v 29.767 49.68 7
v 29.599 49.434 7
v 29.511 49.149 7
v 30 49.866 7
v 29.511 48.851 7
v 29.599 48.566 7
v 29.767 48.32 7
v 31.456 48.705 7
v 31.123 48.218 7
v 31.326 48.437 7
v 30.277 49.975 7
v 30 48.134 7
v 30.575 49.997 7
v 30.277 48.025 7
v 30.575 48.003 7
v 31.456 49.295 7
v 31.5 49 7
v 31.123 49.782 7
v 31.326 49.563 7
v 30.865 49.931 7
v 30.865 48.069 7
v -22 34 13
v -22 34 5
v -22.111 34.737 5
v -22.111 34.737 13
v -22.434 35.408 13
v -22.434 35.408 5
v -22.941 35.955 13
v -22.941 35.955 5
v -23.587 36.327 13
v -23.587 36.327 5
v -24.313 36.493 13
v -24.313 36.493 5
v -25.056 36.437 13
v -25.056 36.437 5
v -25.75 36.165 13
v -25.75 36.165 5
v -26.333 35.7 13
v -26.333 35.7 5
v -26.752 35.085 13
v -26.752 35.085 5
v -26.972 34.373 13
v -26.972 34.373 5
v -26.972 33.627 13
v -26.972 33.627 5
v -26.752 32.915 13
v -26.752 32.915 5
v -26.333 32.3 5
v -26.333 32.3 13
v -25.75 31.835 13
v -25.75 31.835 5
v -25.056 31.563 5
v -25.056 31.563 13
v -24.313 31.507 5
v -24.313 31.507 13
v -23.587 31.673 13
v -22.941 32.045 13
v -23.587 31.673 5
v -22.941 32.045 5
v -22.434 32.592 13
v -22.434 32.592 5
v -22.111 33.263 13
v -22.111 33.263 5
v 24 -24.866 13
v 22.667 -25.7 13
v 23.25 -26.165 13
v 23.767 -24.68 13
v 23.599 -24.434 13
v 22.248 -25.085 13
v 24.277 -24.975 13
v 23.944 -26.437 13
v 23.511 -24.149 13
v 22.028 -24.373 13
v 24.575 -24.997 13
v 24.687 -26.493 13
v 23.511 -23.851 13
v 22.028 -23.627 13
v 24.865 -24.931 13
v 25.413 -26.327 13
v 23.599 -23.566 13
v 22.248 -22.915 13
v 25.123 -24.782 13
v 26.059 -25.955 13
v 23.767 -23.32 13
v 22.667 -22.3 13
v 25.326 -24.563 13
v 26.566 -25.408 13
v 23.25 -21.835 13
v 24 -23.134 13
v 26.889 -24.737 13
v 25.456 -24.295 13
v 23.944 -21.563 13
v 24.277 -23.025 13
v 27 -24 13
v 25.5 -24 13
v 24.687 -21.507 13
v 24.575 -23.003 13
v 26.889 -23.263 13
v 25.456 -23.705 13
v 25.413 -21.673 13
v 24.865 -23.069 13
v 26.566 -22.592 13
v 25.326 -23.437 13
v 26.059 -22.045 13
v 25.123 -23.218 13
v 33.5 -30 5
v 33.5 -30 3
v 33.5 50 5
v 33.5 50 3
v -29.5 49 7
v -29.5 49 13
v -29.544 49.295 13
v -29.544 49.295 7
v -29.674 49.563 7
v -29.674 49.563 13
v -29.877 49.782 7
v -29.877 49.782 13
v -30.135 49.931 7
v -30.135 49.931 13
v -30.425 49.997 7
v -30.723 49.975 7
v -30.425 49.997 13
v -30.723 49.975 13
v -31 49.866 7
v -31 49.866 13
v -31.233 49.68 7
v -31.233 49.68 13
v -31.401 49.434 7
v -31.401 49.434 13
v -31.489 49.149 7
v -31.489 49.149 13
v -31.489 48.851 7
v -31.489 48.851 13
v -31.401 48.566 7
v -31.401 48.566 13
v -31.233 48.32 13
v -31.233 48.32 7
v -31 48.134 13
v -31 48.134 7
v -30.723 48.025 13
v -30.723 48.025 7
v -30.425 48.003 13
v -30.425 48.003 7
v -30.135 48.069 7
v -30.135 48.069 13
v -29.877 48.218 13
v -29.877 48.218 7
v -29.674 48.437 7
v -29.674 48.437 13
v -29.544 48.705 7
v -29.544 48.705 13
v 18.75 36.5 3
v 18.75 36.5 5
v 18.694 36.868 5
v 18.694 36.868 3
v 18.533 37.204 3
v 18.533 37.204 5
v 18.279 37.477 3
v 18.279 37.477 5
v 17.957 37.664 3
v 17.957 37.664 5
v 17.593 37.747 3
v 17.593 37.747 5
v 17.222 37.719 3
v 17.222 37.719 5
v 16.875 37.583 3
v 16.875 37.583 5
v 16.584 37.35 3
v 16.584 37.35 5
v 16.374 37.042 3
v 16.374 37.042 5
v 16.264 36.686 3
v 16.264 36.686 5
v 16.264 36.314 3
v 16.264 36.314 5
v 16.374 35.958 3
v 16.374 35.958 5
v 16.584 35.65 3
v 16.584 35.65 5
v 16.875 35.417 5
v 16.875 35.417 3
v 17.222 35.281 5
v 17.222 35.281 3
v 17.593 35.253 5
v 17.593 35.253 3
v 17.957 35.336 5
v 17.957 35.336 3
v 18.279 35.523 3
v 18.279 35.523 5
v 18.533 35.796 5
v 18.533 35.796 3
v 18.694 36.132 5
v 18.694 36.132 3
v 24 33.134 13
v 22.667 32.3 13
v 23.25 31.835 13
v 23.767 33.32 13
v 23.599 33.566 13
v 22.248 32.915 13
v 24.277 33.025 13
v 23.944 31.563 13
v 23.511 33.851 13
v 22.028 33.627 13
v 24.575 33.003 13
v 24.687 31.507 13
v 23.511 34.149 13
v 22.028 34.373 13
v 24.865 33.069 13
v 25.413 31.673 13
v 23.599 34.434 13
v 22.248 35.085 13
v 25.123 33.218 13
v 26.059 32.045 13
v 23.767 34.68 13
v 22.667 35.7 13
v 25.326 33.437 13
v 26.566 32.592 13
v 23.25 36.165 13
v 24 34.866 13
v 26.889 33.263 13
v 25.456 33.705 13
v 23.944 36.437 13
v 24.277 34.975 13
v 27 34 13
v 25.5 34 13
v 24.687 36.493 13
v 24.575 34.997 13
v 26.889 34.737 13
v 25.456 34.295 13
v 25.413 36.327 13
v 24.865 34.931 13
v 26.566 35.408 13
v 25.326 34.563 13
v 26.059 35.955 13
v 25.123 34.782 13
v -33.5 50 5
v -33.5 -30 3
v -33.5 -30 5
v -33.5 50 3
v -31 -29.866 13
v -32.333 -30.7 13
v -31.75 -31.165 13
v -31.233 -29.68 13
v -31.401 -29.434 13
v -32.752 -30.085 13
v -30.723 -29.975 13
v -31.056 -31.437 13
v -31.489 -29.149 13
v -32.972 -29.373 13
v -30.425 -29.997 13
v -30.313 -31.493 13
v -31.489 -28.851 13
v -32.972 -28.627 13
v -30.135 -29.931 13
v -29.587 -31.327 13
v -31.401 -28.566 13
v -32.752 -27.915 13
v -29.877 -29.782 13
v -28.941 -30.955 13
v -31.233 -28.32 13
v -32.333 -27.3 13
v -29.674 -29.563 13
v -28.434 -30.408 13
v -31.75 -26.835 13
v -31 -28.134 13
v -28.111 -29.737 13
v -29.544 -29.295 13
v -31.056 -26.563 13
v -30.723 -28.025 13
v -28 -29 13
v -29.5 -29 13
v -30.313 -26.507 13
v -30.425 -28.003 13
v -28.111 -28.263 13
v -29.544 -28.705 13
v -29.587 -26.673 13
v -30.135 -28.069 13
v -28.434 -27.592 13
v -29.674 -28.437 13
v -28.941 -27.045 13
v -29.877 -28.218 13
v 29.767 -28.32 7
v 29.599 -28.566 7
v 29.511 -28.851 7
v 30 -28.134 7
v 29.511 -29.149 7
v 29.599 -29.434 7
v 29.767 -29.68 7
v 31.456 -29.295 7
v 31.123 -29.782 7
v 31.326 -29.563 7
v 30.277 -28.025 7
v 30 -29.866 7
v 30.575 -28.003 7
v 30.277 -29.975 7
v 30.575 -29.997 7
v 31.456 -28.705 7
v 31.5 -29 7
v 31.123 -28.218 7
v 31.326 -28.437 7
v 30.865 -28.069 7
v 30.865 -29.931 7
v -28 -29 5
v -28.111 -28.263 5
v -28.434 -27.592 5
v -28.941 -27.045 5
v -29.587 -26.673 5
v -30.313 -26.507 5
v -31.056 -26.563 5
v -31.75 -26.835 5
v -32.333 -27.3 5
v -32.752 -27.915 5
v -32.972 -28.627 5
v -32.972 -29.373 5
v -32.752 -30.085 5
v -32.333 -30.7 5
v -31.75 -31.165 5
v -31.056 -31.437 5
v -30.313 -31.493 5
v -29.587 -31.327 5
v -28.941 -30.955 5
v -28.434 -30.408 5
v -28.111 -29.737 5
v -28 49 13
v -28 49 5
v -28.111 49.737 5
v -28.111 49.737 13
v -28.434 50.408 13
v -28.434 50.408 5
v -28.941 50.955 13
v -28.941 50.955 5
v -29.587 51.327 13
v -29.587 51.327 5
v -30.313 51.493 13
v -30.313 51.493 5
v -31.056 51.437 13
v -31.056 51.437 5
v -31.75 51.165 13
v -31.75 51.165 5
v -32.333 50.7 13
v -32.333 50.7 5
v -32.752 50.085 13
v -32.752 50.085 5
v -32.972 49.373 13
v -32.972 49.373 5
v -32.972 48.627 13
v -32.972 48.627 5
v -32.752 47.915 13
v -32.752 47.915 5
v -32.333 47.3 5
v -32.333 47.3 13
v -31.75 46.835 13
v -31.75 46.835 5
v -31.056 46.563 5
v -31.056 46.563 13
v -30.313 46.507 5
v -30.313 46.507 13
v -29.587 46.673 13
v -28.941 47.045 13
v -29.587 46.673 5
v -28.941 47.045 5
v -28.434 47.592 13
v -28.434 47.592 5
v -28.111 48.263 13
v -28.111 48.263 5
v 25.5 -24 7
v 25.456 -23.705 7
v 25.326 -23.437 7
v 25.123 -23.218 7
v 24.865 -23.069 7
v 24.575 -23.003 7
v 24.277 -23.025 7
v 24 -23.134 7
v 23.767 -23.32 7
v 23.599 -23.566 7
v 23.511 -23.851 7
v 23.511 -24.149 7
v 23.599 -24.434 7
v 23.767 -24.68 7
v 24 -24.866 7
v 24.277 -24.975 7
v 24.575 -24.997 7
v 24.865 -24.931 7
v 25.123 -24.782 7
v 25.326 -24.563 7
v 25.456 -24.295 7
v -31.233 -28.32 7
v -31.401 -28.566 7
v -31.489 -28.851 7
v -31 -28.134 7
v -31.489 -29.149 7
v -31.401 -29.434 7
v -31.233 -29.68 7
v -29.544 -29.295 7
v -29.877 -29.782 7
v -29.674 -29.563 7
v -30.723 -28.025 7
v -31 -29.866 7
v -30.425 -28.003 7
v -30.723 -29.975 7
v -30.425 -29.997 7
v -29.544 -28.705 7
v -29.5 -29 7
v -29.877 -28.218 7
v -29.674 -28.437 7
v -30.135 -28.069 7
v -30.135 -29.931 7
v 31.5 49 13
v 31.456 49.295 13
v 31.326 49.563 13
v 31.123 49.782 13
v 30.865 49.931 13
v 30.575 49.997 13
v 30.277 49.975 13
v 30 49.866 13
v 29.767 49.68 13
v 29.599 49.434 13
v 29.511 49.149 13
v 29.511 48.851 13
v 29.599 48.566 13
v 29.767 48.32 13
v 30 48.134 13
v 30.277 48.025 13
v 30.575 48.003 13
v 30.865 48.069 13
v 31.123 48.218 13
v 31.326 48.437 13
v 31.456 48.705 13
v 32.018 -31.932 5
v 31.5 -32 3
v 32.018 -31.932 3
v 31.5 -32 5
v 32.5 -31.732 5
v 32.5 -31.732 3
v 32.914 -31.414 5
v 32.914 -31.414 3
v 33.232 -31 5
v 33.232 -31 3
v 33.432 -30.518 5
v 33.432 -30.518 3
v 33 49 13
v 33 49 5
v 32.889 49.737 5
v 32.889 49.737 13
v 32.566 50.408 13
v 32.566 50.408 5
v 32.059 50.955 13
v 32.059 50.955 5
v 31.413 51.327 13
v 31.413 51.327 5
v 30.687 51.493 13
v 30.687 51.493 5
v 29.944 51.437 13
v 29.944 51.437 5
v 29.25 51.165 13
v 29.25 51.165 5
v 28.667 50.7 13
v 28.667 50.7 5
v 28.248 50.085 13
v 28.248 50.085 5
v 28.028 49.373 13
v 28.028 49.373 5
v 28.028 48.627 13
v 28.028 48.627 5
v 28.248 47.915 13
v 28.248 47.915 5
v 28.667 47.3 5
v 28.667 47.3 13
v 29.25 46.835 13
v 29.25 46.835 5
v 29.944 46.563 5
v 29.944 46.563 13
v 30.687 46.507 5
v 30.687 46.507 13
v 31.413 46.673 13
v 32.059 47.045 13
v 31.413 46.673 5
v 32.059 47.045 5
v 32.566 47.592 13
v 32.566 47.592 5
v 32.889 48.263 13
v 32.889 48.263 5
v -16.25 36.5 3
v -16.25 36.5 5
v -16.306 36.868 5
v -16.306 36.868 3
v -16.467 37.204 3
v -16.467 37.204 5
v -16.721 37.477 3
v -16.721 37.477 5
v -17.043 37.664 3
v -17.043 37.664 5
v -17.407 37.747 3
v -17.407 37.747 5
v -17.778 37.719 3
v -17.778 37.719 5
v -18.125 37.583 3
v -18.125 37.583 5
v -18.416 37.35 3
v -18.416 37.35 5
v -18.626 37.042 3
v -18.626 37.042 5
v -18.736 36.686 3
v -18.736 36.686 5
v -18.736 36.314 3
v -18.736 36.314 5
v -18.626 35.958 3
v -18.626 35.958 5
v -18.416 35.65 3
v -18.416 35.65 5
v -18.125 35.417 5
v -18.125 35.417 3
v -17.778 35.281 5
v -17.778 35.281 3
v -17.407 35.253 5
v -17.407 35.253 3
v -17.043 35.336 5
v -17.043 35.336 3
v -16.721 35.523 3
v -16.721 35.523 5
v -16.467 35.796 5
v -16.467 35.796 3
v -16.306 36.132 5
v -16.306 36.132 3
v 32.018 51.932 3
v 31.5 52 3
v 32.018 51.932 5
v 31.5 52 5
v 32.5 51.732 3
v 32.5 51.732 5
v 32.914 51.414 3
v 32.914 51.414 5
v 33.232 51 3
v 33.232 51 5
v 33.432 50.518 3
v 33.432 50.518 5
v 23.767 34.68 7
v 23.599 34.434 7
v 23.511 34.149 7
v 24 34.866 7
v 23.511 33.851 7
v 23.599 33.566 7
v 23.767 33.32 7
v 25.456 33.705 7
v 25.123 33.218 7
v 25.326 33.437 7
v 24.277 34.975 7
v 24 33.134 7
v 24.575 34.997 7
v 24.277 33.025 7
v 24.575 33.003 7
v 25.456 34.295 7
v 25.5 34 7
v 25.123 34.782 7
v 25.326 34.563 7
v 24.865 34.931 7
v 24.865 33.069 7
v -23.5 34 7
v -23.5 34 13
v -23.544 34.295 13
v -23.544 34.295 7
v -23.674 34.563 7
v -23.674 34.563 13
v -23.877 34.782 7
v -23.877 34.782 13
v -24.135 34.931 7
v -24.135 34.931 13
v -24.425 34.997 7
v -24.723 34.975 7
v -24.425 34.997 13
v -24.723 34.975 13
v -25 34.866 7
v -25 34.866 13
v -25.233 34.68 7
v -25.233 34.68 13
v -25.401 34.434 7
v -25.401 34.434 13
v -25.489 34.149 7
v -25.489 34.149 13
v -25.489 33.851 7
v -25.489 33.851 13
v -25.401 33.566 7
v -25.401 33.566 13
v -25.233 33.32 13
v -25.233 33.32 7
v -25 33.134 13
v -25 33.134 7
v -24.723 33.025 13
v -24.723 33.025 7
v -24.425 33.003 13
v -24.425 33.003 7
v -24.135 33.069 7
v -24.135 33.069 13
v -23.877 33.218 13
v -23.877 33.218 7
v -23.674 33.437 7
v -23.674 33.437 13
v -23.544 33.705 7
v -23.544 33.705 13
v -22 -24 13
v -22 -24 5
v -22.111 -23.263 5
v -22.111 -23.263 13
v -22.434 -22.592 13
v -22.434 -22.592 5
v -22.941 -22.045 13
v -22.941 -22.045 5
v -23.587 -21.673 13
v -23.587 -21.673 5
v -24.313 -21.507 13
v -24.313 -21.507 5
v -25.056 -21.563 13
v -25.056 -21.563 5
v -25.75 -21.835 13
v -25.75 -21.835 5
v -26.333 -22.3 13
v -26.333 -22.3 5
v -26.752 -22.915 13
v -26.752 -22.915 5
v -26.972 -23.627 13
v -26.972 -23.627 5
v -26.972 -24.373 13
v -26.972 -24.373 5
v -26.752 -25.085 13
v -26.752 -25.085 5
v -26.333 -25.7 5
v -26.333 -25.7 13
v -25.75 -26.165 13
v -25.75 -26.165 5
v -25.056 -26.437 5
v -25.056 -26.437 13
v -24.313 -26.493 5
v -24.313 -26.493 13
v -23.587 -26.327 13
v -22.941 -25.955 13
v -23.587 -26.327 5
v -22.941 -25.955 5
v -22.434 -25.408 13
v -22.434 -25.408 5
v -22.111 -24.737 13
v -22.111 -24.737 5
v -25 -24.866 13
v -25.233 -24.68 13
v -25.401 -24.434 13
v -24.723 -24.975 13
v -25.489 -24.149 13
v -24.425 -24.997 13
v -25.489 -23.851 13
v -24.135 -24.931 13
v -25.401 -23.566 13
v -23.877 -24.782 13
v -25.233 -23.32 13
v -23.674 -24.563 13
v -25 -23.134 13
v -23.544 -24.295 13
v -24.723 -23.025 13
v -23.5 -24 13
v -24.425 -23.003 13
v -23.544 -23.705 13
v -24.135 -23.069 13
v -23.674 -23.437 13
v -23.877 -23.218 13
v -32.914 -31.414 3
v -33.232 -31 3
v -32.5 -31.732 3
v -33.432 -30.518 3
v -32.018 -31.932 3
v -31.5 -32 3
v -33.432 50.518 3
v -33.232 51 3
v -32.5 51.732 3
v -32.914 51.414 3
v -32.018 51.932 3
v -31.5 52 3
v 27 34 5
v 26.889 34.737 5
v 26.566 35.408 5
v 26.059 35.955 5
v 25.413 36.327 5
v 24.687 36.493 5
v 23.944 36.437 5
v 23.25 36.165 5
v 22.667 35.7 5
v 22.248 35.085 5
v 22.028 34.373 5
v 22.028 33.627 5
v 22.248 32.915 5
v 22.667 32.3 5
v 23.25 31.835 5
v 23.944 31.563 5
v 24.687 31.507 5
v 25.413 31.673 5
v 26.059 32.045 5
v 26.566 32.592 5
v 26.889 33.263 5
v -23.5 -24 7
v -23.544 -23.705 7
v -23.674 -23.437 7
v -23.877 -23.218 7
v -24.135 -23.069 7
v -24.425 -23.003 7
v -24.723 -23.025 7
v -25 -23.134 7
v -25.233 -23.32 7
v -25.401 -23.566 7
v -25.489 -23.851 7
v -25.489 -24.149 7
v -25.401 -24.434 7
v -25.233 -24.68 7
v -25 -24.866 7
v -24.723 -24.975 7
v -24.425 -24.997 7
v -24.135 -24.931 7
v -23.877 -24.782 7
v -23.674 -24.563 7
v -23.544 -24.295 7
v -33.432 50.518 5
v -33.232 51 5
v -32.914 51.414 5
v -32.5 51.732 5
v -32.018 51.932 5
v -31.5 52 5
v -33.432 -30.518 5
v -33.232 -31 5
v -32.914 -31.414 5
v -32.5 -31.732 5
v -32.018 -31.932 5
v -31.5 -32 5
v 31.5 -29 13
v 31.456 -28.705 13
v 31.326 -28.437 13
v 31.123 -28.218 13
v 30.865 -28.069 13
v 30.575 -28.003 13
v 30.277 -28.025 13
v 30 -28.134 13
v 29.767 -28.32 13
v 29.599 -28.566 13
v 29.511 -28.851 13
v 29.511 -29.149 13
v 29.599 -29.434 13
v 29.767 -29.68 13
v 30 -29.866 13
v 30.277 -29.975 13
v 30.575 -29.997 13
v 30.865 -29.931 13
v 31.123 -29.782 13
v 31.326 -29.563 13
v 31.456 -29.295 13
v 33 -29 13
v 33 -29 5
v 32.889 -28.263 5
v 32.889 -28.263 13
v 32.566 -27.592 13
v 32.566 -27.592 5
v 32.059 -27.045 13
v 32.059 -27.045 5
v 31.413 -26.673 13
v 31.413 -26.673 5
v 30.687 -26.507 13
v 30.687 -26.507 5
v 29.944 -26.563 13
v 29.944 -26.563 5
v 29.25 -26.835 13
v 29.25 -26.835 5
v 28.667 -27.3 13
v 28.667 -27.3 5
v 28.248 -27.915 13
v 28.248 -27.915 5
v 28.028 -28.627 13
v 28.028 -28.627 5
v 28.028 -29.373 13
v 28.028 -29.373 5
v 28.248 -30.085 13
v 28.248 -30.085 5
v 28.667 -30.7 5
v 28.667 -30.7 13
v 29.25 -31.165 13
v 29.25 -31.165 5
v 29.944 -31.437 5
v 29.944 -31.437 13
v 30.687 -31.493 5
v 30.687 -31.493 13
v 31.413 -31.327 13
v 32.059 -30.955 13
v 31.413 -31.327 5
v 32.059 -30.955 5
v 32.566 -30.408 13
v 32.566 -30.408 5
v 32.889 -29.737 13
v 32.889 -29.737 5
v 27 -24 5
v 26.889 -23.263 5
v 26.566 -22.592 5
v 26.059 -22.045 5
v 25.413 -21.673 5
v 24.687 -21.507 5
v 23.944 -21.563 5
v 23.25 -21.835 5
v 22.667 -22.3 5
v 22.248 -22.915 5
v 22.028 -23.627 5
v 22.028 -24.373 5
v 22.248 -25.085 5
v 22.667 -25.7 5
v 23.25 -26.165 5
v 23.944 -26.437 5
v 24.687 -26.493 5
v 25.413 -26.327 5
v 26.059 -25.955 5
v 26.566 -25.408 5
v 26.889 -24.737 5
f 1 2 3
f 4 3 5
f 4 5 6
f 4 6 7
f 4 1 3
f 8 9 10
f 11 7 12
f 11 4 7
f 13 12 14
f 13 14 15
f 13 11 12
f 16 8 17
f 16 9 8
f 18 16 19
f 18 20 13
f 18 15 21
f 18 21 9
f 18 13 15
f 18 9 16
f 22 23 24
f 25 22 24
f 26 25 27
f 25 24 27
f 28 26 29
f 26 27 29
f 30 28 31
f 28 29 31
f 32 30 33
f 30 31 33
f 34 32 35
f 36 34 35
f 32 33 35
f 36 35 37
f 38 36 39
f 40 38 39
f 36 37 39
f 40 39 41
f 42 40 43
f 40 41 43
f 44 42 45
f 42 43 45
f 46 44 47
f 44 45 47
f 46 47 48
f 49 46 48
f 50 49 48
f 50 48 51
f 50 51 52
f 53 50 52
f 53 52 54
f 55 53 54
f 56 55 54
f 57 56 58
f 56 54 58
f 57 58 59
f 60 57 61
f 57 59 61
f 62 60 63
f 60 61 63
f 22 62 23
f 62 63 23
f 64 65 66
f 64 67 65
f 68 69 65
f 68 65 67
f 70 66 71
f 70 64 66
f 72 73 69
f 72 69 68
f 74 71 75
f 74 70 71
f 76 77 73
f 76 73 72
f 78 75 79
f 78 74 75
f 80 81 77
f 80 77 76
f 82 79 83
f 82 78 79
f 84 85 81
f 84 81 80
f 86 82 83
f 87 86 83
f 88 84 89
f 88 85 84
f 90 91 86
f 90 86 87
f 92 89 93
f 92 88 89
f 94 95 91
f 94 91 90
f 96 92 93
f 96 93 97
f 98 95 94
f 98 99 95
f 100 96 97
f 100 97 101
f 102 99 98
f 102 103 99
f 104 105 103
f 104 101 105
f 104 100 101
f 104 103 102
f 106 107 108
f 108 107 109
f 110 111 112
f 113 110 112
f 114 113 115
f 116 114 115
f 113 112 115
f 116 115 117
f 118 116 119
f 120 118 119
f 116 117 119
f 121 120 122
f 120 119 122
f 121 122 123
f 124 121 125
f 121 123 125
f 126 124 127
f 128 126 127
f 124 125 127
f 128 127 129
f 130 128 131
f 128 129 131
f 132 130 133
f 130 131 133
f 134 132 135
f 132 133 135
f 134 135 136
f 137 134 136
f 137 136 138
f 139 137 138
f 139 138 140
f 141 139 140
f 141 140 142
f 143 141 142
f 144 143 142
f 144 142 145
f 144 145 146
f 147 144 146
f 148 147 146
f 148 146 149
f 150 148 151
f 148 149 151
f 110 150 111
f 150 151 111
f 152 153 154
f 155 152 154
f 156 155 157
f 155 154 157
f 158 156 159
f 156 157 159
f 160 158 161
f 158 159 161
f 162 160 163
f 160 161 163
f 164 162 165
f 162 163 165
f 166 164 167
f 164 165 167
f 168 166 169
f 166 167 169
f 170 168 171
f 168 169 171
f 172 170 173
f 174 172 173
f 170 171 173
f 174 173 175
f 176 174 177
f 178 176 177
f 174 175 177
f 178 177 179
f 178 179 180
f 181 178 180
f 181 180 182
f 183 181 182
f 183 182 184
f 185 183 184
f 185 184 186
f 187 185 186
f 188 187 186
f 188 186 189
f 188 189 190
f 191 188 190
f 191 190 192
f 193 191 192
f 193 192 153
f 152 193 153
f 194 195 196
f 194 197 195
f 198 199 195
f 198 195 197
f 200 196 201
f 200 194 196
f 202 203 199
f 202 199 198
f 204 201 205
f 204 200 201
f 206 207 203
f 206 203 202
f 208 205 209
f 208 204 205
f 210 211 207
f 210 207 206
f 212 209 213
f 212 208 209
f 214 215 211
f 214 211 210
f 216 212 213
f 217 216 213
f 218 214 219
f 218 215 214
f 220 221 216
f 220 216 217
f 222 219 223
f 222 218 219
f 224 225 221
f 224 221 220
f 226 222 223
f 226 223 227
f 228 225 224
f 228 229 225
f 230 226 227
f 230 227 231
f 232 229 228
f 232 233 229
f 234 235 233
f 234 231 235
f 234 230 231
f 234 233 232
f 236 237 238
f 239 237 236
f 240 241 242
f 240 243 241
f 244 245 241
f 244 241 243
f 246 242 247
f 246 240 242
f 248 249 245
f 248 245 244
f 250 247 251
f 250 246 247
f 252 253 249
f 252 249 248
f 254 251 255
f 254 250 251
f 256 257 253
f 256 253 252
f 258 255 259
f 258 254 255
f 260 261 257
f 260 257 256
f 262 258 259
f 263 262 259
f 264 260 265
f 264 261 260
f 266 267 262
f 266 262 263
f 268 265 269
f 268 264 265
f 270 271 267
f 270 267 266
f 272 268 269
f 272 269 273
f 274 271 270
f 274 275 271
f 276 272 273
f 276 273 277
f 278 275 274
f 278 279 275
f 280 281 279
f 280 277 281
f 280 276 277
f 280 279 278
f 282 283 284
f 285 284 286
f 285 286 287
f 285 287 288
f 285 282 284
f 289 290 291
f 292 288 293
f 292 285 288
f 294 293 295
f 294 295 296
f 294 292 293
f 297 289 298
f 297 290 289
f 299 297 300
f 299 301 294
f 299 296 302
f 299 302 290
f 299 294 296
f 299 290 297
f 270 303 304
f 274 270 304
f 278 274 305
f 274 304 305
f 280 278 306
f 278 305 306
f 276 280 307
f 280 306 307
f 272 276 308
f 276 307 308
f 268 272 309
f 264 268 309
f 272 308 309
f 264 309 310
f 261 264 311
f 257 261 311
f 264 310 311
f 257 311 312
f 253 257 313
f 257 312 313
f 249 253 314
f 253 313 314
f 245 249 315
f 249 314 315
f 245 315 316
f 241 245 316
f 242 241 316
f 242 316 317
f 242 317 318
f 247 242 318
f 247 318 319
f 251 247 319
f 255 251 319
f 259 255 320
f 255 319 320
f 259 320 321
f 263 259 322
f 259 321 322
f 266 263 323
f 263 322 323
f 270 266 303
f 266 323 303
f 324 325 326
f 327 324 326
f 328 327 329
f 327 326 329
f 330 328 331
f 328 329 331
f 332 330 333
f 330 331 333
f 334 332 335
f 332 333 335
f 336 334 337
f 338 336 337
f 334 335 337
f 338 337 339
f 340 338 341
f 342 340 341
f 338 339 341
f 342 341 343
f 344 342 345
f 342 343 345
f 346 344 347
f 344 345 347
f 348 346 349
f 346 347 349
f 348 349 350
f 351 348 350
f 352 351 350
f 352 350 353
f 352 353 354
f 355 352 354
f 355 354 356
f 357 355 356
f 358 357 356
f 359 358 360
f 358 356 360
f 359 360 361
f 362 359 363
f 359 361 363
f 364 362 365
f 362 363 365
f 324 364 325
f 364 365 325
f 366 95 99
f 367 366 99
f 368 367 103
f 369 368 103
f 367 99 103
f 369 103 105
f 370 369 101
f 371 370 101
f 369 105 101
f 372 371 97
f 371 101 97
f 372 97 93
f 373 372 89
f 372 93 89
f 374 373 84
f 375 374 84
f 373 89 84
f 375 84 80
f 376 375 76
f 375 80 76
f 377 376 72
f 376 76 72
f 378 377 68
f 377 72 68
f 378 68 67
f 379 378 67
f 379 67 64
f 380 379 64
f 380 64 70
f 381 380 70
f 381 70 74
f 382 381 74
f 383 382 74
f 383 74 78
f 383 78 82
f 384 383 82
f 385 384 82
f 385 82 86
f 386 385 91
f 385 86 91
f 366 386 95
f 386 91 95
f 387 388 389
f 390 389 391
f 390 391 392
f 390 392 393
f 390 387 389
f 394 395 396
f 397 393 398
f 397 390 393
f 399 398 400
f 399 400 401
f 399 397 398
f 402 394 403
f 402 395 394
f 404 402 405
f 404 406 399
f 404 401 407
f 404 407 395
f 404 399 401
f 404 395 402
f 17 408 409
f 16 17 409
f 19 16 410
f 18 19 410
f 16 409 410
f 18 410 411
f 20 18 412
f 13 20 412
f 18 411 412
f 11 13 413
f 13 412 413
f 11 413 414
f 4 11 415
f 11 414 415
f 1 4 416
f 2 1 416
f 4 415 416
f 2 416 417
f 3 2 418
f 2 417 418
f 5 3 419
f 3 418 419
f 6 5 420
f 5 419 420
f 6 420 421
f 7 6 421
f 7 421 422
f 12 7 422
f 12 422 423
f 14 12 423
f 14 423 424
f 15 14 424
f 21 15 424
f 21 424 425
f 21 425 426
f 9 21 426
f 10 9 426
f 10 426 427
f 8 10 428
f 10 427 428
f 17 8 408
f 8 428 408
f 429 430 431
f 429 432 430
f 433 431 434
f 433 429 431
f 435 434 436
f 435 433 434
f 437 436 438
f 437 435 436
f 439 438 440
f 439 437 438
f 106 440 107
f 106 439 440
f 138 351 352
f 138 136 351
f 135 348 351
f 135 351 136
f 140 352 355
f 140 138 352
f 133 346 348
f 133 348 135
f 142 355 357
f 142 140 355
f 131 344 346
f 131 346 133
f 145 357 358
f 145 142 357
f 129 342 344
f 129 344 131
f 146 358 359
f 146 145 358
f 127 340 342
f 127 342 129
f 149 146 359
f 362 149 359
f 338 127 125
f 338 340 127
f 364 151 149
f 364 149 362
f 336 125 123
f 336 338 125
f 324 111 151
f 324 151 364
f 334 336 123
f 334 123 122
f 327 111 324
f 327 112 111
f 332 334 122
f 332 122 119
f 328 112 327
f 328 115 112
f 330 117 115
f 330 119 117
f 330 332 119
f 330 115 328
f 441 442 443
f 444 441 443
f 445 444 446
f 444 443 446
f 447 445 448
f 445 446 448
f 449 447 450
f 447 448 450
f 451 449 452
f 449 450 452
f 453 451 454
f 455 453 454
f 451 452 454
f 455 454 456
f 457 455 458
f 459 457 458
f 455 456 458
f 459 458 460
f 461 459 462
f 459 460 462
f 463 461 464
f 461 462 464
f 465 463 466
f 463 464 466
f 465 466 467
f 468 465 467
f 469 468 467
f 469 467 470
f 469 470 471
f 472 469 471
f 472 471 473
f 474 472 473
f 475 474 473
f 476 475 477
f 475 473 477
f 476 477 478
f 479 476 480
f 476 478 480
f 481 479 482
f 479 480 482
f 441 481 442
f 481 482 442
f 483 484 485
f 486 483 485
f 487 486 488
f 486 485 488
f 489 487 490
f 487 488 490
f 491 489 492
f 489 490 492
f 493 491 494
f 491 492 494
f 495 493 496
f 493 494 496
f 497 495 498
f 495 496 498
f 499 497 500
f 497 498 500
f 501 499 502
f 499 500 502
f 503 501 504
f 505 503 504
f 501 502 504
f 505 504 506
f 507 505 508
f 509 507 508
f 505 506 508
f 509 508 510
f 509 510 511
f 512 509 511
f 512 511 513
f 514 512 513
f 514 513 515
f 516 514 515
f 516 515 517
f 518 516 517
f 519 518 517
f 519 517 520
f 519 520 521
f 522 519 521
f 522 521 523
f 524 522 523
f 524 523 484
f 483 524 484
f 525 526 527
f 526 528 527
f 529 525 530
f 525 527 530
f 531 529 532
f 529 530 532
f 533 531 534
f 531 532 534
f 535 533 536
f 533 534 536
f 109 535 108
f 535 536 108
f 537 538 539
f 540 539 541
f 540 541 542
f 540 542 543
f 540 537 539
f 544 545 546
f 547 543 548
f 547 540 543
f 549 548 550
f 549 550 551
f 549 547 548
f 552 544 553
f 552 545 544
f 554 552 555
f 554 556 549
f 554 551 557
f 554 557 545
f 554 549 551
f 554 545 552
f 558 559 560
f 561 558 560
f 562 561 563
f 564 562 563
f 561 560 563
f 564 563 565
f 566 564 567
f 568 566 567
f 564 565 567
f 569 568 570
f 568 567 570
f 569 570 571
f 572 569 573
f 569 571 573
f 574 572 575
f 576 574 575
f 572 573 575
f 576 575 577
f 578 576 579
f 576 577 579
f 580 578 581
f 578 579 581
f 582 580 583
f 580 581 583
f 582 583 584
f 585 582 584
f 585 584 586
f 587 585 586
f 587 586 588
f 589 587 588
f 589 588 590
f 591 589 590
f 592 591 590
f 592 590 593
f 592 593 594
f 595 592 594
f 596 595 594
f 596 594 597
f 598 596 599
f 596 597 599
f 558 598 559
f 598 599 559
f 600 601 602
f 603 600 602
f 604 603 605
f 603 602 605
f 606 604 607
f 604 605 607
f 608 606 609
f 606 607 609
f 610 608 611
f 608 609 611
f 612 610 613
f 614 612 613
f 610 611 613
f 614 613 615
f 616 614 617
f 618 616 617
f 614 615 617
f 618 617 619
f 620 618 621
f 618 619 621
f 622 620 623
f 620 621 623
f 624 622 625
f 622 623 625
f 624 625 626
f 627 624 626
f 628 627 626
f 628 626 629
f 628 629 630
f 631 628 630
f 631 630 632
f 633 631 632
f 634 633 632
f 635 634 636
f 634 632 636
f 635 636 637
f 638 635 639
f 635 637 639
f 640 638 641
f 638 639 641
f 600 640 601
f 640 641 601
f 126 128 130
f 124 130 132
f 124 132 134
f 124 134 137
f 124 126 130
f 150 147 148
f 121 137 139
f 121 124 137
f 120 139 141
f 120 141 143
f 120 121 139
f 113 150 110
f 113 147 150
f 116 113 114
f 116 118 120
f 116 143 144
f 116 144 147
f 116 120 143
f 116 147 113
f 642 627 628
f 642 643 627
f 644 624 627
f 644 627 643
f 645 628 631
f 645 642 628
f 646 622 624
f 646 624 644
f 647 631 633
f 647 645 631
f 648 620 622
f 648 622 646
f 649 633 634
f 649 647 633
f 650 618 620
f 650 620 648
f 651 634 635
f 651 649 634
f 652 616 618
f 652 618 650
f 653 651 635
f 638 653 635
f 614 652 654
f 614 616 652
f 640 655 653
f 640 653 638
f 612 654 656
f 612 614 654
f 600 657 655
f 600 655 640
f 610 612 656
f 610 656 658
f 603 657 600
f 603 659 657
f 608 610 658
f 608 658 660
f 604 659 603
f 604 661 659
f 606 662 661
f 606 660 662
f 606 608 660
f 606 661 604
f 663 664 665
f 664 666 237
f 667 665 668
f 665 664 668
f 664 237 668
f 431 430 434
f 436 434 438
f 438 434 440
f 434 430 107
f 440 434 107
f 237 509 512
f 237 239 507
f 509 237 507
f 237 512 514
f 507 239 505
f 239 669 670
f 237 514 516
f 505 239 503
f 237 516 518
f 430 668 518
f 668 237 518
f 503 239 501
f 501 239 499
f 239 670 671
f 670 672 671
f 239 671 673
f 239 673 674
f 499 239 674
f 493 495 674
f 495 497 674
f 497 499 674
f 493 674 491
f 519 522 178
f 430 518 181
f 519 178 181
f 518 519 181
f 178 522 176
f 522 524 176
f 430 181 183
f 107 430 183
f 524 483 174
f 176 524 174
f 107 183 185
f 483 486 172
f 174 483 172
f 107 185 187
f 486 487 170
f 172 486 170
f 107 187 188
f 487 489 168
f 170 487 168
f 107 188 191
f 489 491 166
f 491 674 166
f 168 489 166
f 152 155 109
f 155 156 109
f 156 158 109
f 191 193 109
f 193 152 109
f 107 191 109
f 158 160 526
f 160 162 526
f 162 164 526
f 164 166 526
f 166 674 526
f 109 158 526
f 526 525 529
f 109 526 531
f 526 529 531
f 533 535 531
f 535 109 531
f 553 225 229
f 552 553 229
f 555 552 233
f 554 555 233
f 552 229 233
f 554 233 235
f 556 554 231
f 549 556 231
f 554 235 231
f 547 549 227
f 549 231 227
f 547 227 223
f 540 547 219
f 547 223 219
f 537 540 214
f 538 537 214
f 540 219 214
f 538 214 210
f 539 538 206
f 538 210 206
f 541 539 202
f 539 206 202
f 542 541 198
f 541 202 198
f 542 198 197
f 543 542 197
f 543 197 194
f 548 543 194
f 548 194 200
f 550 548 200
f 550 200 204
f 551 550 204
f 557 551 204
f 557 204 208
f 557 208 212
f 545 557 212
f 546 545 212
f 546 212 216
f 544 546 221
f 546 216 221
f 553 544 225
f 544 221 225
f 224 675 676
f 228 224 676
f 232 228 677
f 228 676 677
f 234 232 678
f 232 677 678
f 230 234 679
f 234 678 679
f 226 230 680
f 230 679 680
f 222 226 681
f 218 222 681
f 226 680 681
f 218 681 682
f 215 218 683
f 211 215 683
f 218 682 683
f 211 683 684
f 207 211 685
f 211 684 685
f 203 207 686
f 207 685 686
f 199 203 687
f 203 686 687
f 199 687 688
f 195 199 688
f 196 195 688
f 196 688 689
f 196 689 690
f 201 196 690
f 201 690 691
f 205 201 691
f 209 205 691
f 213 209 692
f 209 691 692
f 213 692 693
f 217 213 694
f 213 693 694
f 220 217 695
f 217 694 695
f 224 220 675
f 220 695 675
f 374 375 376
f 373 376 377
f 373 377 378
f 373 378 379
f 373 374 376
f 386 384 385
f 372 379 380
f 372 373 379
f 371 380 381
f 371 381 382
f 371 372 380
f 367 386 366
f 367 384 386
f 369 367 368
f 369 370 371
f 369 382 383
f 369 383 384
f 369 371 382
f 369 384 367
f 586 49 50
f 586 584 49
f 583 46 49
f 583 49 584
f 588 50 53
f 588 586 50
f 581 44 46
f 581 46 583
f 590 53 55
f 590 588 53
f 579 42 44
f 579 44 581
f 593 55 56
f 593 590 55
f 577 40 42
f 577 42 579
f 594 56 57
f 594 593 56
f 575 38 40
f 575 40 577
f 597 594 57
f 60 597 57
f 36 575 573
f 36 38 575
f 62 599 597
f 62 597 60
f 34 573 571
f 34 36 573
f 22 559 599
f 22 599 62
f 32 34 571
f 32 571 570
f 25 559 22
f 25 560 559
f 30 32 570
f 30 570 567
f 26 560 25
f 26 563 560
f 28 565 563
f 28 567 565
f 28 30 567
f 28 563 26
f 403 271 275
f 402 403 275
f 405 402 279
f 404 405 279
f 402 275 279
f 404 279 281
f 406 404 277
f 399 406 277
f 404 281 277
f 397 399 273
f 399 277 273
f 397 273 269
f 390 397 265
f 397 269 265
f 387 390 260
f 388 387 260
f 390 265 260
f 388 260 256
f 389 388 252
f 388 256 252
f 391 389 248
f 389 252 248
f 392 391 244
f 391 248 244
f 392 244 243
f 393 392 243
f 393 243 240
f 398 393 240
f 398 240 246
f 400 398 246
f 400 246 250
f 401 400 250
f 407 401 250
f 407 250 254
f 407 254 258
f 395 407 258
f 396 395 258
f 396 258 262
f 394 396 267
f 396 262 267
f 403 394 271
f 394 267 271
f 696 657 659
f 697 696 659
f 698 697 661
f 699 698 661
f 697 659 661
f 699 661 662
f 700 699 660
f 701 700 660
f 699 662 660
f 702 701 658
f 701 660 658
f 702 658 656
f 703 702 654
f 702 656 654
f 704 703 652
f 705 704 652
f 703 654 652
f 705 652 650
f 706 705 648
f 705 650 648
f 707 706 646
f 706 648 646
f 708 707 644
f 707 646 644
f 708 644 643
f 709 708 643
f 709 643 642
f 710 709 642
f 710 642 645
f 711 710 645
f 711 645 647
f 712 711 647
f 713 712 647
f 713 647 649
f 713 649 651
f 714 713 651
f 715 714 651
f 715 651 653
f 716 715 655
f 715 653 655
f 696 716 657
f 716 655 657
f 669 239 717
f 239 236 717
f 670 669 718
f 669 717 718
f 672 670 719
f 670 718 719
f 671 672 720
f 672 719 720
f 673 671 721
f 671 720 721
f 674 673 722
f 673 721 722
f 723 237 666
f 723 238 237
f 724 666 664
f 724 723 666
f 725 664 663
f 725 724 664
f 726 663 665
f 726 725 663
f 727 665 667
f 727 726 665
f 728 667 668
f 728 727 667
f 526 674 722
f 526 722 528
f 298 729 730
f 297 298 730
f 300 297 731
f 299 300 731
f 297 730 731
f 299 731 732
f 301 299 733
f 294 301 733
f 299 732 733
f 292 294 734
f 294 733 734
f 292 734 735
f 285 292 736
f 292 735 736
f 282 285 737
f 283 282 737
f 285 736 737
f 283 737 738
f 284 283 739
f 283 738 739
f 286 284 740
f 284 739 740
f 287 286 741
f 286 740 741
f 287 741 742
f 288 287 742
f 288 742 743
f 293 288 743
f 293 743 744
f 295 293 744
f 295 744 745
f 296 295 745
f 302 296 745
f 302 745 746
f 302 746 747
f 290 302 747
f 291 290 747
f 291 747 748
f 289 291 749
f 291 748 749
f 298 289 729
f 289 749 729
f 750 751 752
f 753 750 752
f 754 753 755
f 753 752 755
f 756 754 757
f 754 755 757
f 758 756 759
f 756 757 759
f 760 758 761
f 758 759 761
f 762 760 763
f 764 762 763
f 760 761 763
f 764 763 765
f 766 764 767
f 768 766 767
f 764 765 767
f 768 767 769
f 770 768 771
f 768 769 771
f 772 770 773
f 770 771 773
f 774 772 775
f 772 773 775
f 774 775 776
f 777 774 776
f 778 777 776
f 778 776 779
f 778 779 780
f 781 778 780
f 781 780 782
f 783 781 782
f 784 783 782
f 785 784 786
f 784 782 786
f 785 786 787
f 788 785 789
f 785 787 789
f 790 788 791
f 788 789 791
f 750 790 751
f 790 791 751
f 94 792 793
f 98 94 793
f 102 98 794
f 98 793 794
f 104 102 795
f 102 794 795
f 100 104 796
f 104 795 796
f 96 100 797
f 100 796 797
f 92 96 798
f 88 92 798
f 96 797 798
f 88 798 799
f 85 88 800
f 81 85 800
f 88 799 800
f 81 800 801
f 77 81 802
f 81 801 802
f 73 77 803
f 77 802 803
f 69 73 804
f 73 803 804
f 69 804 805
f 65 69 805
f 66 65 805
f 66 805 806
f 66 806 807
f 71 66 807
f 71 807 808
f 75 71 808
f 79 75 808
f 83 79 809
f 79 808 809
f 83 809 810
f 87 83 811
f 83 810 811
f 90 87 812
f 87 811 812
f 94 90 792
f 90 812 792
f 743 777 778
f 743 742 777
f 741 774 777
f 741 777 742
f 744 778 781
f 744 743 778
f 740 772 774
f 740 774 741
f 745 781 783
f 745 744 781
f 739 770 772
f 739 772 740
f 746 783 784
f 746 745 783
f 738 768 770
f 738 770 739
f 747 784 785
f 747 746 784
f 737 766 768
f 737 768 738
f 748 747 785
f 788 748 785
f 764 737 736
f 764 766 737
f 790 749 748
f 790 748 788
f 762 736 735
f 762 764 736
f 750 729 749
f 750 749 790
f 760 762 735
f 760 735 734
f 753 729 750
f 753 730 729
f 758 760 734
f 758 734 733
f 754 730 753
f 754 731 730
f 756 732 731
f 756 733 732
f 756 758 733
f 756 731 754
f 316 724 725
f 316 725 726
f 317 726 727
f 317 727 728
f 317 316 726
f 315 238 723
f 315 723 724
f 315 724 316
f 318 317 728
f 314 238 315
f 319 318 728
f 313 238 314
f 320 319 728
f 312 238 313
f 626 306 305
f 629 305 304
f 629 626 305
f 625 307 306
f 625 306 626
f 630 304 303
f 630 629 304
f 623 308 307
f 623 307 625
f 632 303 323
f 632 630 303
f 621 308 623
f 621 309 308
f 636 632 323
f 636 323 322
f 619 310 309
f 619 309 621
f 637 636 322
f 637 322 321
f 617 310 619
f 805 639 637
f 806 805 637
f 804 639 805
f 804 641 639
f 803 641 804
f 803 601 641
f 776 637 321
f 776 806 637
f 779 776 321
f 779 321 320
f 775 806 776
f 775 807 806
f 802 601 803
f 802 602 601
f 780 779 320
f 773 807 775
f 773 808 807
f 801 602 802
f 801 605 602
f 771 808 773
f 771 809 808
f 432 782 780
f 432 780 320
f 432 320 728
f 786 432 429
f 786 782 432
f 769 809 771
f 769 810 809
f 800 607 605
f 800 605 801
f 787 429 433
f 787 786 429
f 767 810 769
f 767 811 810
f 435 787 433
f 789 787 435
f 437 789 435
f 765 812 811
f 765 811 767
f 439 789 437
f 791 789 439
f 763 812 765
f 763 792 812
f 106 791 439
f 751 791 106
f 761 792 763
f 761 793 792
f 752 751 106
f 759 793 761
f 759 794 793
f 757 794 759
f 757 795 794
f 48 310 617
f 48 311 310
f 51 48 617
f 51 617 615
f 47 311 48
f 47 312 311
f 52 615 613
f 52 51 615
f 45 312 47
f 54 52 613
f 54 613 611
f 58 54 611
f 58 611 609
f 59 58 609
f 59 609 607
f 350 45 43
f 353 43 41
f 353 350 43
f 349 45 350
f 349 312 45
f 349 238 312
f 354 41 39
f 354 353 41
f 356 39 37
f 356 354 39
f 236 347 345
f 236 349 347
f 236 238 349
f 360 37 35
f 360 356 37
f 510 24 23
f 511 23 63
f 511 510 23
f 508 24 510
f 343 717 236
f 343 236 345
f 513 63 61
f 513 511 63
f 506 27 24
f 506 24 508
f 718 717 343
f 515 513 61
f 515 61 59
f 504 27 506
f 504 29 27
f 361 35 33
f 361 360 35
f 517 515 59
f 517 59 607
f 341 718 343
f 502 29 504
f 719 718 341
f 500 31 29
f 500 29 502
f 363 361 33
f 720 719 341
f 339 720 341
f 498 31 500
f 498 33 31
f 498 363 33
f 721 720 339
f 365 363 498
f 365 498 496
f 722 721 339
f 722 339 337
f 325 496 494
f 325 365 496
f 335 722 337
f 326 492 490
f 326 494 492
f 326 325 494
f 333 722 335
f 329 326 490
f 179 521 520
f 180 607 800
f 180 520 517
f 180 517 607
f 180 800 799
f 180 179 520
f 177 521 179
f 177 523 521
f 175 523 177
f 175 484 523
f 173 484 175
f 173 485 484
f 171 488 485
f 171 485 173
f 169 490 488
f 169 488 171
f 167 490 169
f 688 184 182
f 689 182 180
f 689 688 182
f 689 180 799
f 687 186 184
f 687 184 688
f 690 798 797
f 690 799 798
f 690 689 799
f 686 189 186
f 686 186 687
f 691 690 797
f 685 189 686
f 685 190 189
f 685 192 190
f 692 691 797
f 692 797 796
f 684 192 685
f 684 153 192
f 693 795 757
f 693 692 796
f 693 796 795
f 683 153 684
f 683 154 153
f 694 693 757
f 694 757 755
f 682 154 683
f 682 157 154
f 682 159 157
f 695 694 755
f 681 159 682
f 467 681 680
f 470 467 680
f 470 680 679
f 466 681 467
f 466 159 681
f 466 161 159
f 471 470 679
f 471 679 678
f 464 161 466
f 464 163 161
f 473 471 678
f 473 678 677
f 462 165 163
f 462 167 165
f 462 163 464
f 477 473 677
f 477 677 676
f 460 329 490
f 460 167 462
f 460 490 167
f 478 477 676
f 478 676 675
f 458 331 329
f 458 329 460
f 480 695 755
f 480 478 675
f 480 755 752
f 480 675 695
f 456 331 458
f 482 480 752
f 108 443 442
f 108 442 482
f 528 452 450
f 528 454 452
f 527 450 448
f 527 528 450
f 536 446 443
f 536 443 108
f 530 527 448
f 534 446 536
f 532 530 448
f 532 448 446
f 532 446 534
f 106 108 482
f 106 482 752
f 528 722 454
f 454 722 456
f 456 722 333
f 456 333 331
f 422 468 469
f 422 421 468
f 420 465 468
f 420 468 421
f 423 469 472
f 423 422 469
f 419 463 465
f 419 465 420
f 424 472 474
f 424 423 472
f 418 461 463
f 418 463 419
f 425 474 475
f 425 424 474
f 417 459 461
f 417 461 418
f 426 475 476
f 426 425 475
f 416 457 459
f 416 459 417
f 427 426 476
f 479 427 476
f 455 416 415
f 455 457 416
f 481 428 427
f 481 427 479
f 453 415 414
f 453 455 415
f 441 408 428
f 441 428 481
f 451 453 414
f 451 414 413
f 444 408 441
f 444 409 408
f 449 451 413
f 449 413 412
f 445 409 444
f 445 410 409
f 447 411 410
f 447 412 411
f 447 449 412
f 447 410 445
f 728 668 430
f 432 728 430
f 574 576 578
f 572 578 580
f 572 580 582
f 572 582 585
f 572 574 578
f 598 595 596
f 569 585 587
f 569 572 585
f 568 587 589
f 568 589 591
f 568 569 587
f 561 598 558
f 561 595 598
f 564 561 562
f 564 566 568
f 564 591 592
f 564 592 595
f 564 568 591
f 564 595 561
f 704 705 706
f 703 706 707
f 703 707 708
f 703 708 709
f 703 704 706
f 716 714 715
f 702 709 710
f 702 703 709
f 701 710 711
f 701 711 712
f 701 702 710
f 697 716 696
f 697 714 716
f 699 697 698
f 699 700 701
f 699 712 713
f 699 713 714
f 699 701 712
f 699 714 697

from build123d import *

# Parameters (mm, degrees)
SKETCH032_W     = 67
SKETCH032_H     = 84
PAD014_DEPTH    = 2
SKETCH033_R     = 1.25
POCKET_DEPTH    = 2.001
SKETCH034_R     = 2.5
PAD015_DEPTH    = 8
SKETCH035_R     = 2.5
PAD016_DEPTH    = 8
SKETCH036_R     = 1
POCKET009_DEPTH = 6
FILLET_R        = 2


with BuildPart() as part:
    # Sketch032 → Pad014 (new body)
    with BuildSketch(Plane.XY):
        with Locations((0, 10)):
            Rectangle(SKETCH032_W, SKETCH032_H)
    extrude(amount=PAD014_DEPTH)

    # Sketch033 (on Face6 of Pad014) → Pocket (cut, through all)
    with BuildSketch(Plane.XY.offset(2)):
        with Locations((-17.5, 36.5)):
            Circle(SKETCH033_R)
        with Locations((17.5, 36.5)):
            Circle(SKETCH033_R)
    extrude(amount=-POCKET_DEPTH, mode=Mode.SUBTRACT)

    # Sketch034 (on Face5 of Pocket) → Pad015 (join)
    with BuildSketch(Plane.XY.offset(2)):
        with Locations((-30.5, 49)):
            Circle(SKETCH034_R)
        with Locations((-30.5, -29)):
            Circle(SKETCH034_R)
        with Locations((30.5, 49)):
            Circle(SKETCH034_R)
        with Locations((30.5, -29)):
            Circle(SKETCH034_R)
    extrude(amount=PAD015_DEPTH)

    # Sketch035 (on Face5 of Pad015) → Pad016 (join)
    with BuildSketch(Plane.XY.offset(2)):
        with Locations((-24.5, 34)):
            Circle(SKETCH035_R)
        with Locations((24.5, 34)):
            Circle(SKETCH035_R)
        with Locations((-24.5, -24)):
            Circle(SKETCH035_R)
        with Locations((24.5, -24)):
            Circle(SKETCH035_R)
    extrude(amount=PAD016_DEPTH)

    # Sketch036 (on Face19 of Pad016) → Pocket009 (cut)
    with BuildSketch(Plane.XY.offset(10)):
        with Locations((-30.5, 49)):
            Circle(SKETCH036_R)
        with Locations((-24.5, 34)):
            Circle(SKETCH036_R)
        with Locations((30.5, 49)):
            Circle(SKETCH036_R)
        with Locations((24.5, 34)):
            Circle(SKETCH036_R)
        with Locations((30.5, -29)):
            Circle(SKETCH036_R)
        with Locations((24.5, -24)):
            Circle(SKETCH036_R)
        with Locations((-24.5, -24)):
            Circle(SKETCH036_R)
        with Locations((-30.5, -29)):
            Circle(SKETCH036_R)
    extrude(amount=-POCKET009_DEPTH, mode=Mode.SUBTRACT)

    # Fillet
    fillet_edges = [part.edges().sort_by_distance(p)[0] for p in [
        (-33.5, -32, 1),
        (33.5, -32, 1),
        (-33.5, 52, 1),
        (33.5, 52, 1),
    ]]
    fillet(fillet_edges, radius=FILLET_R)


with BuildPart() as part_1:
    # Body011 placement: moved
    add(part.part.moved(Location((0, 0, 3))))


solid = part_1.part
